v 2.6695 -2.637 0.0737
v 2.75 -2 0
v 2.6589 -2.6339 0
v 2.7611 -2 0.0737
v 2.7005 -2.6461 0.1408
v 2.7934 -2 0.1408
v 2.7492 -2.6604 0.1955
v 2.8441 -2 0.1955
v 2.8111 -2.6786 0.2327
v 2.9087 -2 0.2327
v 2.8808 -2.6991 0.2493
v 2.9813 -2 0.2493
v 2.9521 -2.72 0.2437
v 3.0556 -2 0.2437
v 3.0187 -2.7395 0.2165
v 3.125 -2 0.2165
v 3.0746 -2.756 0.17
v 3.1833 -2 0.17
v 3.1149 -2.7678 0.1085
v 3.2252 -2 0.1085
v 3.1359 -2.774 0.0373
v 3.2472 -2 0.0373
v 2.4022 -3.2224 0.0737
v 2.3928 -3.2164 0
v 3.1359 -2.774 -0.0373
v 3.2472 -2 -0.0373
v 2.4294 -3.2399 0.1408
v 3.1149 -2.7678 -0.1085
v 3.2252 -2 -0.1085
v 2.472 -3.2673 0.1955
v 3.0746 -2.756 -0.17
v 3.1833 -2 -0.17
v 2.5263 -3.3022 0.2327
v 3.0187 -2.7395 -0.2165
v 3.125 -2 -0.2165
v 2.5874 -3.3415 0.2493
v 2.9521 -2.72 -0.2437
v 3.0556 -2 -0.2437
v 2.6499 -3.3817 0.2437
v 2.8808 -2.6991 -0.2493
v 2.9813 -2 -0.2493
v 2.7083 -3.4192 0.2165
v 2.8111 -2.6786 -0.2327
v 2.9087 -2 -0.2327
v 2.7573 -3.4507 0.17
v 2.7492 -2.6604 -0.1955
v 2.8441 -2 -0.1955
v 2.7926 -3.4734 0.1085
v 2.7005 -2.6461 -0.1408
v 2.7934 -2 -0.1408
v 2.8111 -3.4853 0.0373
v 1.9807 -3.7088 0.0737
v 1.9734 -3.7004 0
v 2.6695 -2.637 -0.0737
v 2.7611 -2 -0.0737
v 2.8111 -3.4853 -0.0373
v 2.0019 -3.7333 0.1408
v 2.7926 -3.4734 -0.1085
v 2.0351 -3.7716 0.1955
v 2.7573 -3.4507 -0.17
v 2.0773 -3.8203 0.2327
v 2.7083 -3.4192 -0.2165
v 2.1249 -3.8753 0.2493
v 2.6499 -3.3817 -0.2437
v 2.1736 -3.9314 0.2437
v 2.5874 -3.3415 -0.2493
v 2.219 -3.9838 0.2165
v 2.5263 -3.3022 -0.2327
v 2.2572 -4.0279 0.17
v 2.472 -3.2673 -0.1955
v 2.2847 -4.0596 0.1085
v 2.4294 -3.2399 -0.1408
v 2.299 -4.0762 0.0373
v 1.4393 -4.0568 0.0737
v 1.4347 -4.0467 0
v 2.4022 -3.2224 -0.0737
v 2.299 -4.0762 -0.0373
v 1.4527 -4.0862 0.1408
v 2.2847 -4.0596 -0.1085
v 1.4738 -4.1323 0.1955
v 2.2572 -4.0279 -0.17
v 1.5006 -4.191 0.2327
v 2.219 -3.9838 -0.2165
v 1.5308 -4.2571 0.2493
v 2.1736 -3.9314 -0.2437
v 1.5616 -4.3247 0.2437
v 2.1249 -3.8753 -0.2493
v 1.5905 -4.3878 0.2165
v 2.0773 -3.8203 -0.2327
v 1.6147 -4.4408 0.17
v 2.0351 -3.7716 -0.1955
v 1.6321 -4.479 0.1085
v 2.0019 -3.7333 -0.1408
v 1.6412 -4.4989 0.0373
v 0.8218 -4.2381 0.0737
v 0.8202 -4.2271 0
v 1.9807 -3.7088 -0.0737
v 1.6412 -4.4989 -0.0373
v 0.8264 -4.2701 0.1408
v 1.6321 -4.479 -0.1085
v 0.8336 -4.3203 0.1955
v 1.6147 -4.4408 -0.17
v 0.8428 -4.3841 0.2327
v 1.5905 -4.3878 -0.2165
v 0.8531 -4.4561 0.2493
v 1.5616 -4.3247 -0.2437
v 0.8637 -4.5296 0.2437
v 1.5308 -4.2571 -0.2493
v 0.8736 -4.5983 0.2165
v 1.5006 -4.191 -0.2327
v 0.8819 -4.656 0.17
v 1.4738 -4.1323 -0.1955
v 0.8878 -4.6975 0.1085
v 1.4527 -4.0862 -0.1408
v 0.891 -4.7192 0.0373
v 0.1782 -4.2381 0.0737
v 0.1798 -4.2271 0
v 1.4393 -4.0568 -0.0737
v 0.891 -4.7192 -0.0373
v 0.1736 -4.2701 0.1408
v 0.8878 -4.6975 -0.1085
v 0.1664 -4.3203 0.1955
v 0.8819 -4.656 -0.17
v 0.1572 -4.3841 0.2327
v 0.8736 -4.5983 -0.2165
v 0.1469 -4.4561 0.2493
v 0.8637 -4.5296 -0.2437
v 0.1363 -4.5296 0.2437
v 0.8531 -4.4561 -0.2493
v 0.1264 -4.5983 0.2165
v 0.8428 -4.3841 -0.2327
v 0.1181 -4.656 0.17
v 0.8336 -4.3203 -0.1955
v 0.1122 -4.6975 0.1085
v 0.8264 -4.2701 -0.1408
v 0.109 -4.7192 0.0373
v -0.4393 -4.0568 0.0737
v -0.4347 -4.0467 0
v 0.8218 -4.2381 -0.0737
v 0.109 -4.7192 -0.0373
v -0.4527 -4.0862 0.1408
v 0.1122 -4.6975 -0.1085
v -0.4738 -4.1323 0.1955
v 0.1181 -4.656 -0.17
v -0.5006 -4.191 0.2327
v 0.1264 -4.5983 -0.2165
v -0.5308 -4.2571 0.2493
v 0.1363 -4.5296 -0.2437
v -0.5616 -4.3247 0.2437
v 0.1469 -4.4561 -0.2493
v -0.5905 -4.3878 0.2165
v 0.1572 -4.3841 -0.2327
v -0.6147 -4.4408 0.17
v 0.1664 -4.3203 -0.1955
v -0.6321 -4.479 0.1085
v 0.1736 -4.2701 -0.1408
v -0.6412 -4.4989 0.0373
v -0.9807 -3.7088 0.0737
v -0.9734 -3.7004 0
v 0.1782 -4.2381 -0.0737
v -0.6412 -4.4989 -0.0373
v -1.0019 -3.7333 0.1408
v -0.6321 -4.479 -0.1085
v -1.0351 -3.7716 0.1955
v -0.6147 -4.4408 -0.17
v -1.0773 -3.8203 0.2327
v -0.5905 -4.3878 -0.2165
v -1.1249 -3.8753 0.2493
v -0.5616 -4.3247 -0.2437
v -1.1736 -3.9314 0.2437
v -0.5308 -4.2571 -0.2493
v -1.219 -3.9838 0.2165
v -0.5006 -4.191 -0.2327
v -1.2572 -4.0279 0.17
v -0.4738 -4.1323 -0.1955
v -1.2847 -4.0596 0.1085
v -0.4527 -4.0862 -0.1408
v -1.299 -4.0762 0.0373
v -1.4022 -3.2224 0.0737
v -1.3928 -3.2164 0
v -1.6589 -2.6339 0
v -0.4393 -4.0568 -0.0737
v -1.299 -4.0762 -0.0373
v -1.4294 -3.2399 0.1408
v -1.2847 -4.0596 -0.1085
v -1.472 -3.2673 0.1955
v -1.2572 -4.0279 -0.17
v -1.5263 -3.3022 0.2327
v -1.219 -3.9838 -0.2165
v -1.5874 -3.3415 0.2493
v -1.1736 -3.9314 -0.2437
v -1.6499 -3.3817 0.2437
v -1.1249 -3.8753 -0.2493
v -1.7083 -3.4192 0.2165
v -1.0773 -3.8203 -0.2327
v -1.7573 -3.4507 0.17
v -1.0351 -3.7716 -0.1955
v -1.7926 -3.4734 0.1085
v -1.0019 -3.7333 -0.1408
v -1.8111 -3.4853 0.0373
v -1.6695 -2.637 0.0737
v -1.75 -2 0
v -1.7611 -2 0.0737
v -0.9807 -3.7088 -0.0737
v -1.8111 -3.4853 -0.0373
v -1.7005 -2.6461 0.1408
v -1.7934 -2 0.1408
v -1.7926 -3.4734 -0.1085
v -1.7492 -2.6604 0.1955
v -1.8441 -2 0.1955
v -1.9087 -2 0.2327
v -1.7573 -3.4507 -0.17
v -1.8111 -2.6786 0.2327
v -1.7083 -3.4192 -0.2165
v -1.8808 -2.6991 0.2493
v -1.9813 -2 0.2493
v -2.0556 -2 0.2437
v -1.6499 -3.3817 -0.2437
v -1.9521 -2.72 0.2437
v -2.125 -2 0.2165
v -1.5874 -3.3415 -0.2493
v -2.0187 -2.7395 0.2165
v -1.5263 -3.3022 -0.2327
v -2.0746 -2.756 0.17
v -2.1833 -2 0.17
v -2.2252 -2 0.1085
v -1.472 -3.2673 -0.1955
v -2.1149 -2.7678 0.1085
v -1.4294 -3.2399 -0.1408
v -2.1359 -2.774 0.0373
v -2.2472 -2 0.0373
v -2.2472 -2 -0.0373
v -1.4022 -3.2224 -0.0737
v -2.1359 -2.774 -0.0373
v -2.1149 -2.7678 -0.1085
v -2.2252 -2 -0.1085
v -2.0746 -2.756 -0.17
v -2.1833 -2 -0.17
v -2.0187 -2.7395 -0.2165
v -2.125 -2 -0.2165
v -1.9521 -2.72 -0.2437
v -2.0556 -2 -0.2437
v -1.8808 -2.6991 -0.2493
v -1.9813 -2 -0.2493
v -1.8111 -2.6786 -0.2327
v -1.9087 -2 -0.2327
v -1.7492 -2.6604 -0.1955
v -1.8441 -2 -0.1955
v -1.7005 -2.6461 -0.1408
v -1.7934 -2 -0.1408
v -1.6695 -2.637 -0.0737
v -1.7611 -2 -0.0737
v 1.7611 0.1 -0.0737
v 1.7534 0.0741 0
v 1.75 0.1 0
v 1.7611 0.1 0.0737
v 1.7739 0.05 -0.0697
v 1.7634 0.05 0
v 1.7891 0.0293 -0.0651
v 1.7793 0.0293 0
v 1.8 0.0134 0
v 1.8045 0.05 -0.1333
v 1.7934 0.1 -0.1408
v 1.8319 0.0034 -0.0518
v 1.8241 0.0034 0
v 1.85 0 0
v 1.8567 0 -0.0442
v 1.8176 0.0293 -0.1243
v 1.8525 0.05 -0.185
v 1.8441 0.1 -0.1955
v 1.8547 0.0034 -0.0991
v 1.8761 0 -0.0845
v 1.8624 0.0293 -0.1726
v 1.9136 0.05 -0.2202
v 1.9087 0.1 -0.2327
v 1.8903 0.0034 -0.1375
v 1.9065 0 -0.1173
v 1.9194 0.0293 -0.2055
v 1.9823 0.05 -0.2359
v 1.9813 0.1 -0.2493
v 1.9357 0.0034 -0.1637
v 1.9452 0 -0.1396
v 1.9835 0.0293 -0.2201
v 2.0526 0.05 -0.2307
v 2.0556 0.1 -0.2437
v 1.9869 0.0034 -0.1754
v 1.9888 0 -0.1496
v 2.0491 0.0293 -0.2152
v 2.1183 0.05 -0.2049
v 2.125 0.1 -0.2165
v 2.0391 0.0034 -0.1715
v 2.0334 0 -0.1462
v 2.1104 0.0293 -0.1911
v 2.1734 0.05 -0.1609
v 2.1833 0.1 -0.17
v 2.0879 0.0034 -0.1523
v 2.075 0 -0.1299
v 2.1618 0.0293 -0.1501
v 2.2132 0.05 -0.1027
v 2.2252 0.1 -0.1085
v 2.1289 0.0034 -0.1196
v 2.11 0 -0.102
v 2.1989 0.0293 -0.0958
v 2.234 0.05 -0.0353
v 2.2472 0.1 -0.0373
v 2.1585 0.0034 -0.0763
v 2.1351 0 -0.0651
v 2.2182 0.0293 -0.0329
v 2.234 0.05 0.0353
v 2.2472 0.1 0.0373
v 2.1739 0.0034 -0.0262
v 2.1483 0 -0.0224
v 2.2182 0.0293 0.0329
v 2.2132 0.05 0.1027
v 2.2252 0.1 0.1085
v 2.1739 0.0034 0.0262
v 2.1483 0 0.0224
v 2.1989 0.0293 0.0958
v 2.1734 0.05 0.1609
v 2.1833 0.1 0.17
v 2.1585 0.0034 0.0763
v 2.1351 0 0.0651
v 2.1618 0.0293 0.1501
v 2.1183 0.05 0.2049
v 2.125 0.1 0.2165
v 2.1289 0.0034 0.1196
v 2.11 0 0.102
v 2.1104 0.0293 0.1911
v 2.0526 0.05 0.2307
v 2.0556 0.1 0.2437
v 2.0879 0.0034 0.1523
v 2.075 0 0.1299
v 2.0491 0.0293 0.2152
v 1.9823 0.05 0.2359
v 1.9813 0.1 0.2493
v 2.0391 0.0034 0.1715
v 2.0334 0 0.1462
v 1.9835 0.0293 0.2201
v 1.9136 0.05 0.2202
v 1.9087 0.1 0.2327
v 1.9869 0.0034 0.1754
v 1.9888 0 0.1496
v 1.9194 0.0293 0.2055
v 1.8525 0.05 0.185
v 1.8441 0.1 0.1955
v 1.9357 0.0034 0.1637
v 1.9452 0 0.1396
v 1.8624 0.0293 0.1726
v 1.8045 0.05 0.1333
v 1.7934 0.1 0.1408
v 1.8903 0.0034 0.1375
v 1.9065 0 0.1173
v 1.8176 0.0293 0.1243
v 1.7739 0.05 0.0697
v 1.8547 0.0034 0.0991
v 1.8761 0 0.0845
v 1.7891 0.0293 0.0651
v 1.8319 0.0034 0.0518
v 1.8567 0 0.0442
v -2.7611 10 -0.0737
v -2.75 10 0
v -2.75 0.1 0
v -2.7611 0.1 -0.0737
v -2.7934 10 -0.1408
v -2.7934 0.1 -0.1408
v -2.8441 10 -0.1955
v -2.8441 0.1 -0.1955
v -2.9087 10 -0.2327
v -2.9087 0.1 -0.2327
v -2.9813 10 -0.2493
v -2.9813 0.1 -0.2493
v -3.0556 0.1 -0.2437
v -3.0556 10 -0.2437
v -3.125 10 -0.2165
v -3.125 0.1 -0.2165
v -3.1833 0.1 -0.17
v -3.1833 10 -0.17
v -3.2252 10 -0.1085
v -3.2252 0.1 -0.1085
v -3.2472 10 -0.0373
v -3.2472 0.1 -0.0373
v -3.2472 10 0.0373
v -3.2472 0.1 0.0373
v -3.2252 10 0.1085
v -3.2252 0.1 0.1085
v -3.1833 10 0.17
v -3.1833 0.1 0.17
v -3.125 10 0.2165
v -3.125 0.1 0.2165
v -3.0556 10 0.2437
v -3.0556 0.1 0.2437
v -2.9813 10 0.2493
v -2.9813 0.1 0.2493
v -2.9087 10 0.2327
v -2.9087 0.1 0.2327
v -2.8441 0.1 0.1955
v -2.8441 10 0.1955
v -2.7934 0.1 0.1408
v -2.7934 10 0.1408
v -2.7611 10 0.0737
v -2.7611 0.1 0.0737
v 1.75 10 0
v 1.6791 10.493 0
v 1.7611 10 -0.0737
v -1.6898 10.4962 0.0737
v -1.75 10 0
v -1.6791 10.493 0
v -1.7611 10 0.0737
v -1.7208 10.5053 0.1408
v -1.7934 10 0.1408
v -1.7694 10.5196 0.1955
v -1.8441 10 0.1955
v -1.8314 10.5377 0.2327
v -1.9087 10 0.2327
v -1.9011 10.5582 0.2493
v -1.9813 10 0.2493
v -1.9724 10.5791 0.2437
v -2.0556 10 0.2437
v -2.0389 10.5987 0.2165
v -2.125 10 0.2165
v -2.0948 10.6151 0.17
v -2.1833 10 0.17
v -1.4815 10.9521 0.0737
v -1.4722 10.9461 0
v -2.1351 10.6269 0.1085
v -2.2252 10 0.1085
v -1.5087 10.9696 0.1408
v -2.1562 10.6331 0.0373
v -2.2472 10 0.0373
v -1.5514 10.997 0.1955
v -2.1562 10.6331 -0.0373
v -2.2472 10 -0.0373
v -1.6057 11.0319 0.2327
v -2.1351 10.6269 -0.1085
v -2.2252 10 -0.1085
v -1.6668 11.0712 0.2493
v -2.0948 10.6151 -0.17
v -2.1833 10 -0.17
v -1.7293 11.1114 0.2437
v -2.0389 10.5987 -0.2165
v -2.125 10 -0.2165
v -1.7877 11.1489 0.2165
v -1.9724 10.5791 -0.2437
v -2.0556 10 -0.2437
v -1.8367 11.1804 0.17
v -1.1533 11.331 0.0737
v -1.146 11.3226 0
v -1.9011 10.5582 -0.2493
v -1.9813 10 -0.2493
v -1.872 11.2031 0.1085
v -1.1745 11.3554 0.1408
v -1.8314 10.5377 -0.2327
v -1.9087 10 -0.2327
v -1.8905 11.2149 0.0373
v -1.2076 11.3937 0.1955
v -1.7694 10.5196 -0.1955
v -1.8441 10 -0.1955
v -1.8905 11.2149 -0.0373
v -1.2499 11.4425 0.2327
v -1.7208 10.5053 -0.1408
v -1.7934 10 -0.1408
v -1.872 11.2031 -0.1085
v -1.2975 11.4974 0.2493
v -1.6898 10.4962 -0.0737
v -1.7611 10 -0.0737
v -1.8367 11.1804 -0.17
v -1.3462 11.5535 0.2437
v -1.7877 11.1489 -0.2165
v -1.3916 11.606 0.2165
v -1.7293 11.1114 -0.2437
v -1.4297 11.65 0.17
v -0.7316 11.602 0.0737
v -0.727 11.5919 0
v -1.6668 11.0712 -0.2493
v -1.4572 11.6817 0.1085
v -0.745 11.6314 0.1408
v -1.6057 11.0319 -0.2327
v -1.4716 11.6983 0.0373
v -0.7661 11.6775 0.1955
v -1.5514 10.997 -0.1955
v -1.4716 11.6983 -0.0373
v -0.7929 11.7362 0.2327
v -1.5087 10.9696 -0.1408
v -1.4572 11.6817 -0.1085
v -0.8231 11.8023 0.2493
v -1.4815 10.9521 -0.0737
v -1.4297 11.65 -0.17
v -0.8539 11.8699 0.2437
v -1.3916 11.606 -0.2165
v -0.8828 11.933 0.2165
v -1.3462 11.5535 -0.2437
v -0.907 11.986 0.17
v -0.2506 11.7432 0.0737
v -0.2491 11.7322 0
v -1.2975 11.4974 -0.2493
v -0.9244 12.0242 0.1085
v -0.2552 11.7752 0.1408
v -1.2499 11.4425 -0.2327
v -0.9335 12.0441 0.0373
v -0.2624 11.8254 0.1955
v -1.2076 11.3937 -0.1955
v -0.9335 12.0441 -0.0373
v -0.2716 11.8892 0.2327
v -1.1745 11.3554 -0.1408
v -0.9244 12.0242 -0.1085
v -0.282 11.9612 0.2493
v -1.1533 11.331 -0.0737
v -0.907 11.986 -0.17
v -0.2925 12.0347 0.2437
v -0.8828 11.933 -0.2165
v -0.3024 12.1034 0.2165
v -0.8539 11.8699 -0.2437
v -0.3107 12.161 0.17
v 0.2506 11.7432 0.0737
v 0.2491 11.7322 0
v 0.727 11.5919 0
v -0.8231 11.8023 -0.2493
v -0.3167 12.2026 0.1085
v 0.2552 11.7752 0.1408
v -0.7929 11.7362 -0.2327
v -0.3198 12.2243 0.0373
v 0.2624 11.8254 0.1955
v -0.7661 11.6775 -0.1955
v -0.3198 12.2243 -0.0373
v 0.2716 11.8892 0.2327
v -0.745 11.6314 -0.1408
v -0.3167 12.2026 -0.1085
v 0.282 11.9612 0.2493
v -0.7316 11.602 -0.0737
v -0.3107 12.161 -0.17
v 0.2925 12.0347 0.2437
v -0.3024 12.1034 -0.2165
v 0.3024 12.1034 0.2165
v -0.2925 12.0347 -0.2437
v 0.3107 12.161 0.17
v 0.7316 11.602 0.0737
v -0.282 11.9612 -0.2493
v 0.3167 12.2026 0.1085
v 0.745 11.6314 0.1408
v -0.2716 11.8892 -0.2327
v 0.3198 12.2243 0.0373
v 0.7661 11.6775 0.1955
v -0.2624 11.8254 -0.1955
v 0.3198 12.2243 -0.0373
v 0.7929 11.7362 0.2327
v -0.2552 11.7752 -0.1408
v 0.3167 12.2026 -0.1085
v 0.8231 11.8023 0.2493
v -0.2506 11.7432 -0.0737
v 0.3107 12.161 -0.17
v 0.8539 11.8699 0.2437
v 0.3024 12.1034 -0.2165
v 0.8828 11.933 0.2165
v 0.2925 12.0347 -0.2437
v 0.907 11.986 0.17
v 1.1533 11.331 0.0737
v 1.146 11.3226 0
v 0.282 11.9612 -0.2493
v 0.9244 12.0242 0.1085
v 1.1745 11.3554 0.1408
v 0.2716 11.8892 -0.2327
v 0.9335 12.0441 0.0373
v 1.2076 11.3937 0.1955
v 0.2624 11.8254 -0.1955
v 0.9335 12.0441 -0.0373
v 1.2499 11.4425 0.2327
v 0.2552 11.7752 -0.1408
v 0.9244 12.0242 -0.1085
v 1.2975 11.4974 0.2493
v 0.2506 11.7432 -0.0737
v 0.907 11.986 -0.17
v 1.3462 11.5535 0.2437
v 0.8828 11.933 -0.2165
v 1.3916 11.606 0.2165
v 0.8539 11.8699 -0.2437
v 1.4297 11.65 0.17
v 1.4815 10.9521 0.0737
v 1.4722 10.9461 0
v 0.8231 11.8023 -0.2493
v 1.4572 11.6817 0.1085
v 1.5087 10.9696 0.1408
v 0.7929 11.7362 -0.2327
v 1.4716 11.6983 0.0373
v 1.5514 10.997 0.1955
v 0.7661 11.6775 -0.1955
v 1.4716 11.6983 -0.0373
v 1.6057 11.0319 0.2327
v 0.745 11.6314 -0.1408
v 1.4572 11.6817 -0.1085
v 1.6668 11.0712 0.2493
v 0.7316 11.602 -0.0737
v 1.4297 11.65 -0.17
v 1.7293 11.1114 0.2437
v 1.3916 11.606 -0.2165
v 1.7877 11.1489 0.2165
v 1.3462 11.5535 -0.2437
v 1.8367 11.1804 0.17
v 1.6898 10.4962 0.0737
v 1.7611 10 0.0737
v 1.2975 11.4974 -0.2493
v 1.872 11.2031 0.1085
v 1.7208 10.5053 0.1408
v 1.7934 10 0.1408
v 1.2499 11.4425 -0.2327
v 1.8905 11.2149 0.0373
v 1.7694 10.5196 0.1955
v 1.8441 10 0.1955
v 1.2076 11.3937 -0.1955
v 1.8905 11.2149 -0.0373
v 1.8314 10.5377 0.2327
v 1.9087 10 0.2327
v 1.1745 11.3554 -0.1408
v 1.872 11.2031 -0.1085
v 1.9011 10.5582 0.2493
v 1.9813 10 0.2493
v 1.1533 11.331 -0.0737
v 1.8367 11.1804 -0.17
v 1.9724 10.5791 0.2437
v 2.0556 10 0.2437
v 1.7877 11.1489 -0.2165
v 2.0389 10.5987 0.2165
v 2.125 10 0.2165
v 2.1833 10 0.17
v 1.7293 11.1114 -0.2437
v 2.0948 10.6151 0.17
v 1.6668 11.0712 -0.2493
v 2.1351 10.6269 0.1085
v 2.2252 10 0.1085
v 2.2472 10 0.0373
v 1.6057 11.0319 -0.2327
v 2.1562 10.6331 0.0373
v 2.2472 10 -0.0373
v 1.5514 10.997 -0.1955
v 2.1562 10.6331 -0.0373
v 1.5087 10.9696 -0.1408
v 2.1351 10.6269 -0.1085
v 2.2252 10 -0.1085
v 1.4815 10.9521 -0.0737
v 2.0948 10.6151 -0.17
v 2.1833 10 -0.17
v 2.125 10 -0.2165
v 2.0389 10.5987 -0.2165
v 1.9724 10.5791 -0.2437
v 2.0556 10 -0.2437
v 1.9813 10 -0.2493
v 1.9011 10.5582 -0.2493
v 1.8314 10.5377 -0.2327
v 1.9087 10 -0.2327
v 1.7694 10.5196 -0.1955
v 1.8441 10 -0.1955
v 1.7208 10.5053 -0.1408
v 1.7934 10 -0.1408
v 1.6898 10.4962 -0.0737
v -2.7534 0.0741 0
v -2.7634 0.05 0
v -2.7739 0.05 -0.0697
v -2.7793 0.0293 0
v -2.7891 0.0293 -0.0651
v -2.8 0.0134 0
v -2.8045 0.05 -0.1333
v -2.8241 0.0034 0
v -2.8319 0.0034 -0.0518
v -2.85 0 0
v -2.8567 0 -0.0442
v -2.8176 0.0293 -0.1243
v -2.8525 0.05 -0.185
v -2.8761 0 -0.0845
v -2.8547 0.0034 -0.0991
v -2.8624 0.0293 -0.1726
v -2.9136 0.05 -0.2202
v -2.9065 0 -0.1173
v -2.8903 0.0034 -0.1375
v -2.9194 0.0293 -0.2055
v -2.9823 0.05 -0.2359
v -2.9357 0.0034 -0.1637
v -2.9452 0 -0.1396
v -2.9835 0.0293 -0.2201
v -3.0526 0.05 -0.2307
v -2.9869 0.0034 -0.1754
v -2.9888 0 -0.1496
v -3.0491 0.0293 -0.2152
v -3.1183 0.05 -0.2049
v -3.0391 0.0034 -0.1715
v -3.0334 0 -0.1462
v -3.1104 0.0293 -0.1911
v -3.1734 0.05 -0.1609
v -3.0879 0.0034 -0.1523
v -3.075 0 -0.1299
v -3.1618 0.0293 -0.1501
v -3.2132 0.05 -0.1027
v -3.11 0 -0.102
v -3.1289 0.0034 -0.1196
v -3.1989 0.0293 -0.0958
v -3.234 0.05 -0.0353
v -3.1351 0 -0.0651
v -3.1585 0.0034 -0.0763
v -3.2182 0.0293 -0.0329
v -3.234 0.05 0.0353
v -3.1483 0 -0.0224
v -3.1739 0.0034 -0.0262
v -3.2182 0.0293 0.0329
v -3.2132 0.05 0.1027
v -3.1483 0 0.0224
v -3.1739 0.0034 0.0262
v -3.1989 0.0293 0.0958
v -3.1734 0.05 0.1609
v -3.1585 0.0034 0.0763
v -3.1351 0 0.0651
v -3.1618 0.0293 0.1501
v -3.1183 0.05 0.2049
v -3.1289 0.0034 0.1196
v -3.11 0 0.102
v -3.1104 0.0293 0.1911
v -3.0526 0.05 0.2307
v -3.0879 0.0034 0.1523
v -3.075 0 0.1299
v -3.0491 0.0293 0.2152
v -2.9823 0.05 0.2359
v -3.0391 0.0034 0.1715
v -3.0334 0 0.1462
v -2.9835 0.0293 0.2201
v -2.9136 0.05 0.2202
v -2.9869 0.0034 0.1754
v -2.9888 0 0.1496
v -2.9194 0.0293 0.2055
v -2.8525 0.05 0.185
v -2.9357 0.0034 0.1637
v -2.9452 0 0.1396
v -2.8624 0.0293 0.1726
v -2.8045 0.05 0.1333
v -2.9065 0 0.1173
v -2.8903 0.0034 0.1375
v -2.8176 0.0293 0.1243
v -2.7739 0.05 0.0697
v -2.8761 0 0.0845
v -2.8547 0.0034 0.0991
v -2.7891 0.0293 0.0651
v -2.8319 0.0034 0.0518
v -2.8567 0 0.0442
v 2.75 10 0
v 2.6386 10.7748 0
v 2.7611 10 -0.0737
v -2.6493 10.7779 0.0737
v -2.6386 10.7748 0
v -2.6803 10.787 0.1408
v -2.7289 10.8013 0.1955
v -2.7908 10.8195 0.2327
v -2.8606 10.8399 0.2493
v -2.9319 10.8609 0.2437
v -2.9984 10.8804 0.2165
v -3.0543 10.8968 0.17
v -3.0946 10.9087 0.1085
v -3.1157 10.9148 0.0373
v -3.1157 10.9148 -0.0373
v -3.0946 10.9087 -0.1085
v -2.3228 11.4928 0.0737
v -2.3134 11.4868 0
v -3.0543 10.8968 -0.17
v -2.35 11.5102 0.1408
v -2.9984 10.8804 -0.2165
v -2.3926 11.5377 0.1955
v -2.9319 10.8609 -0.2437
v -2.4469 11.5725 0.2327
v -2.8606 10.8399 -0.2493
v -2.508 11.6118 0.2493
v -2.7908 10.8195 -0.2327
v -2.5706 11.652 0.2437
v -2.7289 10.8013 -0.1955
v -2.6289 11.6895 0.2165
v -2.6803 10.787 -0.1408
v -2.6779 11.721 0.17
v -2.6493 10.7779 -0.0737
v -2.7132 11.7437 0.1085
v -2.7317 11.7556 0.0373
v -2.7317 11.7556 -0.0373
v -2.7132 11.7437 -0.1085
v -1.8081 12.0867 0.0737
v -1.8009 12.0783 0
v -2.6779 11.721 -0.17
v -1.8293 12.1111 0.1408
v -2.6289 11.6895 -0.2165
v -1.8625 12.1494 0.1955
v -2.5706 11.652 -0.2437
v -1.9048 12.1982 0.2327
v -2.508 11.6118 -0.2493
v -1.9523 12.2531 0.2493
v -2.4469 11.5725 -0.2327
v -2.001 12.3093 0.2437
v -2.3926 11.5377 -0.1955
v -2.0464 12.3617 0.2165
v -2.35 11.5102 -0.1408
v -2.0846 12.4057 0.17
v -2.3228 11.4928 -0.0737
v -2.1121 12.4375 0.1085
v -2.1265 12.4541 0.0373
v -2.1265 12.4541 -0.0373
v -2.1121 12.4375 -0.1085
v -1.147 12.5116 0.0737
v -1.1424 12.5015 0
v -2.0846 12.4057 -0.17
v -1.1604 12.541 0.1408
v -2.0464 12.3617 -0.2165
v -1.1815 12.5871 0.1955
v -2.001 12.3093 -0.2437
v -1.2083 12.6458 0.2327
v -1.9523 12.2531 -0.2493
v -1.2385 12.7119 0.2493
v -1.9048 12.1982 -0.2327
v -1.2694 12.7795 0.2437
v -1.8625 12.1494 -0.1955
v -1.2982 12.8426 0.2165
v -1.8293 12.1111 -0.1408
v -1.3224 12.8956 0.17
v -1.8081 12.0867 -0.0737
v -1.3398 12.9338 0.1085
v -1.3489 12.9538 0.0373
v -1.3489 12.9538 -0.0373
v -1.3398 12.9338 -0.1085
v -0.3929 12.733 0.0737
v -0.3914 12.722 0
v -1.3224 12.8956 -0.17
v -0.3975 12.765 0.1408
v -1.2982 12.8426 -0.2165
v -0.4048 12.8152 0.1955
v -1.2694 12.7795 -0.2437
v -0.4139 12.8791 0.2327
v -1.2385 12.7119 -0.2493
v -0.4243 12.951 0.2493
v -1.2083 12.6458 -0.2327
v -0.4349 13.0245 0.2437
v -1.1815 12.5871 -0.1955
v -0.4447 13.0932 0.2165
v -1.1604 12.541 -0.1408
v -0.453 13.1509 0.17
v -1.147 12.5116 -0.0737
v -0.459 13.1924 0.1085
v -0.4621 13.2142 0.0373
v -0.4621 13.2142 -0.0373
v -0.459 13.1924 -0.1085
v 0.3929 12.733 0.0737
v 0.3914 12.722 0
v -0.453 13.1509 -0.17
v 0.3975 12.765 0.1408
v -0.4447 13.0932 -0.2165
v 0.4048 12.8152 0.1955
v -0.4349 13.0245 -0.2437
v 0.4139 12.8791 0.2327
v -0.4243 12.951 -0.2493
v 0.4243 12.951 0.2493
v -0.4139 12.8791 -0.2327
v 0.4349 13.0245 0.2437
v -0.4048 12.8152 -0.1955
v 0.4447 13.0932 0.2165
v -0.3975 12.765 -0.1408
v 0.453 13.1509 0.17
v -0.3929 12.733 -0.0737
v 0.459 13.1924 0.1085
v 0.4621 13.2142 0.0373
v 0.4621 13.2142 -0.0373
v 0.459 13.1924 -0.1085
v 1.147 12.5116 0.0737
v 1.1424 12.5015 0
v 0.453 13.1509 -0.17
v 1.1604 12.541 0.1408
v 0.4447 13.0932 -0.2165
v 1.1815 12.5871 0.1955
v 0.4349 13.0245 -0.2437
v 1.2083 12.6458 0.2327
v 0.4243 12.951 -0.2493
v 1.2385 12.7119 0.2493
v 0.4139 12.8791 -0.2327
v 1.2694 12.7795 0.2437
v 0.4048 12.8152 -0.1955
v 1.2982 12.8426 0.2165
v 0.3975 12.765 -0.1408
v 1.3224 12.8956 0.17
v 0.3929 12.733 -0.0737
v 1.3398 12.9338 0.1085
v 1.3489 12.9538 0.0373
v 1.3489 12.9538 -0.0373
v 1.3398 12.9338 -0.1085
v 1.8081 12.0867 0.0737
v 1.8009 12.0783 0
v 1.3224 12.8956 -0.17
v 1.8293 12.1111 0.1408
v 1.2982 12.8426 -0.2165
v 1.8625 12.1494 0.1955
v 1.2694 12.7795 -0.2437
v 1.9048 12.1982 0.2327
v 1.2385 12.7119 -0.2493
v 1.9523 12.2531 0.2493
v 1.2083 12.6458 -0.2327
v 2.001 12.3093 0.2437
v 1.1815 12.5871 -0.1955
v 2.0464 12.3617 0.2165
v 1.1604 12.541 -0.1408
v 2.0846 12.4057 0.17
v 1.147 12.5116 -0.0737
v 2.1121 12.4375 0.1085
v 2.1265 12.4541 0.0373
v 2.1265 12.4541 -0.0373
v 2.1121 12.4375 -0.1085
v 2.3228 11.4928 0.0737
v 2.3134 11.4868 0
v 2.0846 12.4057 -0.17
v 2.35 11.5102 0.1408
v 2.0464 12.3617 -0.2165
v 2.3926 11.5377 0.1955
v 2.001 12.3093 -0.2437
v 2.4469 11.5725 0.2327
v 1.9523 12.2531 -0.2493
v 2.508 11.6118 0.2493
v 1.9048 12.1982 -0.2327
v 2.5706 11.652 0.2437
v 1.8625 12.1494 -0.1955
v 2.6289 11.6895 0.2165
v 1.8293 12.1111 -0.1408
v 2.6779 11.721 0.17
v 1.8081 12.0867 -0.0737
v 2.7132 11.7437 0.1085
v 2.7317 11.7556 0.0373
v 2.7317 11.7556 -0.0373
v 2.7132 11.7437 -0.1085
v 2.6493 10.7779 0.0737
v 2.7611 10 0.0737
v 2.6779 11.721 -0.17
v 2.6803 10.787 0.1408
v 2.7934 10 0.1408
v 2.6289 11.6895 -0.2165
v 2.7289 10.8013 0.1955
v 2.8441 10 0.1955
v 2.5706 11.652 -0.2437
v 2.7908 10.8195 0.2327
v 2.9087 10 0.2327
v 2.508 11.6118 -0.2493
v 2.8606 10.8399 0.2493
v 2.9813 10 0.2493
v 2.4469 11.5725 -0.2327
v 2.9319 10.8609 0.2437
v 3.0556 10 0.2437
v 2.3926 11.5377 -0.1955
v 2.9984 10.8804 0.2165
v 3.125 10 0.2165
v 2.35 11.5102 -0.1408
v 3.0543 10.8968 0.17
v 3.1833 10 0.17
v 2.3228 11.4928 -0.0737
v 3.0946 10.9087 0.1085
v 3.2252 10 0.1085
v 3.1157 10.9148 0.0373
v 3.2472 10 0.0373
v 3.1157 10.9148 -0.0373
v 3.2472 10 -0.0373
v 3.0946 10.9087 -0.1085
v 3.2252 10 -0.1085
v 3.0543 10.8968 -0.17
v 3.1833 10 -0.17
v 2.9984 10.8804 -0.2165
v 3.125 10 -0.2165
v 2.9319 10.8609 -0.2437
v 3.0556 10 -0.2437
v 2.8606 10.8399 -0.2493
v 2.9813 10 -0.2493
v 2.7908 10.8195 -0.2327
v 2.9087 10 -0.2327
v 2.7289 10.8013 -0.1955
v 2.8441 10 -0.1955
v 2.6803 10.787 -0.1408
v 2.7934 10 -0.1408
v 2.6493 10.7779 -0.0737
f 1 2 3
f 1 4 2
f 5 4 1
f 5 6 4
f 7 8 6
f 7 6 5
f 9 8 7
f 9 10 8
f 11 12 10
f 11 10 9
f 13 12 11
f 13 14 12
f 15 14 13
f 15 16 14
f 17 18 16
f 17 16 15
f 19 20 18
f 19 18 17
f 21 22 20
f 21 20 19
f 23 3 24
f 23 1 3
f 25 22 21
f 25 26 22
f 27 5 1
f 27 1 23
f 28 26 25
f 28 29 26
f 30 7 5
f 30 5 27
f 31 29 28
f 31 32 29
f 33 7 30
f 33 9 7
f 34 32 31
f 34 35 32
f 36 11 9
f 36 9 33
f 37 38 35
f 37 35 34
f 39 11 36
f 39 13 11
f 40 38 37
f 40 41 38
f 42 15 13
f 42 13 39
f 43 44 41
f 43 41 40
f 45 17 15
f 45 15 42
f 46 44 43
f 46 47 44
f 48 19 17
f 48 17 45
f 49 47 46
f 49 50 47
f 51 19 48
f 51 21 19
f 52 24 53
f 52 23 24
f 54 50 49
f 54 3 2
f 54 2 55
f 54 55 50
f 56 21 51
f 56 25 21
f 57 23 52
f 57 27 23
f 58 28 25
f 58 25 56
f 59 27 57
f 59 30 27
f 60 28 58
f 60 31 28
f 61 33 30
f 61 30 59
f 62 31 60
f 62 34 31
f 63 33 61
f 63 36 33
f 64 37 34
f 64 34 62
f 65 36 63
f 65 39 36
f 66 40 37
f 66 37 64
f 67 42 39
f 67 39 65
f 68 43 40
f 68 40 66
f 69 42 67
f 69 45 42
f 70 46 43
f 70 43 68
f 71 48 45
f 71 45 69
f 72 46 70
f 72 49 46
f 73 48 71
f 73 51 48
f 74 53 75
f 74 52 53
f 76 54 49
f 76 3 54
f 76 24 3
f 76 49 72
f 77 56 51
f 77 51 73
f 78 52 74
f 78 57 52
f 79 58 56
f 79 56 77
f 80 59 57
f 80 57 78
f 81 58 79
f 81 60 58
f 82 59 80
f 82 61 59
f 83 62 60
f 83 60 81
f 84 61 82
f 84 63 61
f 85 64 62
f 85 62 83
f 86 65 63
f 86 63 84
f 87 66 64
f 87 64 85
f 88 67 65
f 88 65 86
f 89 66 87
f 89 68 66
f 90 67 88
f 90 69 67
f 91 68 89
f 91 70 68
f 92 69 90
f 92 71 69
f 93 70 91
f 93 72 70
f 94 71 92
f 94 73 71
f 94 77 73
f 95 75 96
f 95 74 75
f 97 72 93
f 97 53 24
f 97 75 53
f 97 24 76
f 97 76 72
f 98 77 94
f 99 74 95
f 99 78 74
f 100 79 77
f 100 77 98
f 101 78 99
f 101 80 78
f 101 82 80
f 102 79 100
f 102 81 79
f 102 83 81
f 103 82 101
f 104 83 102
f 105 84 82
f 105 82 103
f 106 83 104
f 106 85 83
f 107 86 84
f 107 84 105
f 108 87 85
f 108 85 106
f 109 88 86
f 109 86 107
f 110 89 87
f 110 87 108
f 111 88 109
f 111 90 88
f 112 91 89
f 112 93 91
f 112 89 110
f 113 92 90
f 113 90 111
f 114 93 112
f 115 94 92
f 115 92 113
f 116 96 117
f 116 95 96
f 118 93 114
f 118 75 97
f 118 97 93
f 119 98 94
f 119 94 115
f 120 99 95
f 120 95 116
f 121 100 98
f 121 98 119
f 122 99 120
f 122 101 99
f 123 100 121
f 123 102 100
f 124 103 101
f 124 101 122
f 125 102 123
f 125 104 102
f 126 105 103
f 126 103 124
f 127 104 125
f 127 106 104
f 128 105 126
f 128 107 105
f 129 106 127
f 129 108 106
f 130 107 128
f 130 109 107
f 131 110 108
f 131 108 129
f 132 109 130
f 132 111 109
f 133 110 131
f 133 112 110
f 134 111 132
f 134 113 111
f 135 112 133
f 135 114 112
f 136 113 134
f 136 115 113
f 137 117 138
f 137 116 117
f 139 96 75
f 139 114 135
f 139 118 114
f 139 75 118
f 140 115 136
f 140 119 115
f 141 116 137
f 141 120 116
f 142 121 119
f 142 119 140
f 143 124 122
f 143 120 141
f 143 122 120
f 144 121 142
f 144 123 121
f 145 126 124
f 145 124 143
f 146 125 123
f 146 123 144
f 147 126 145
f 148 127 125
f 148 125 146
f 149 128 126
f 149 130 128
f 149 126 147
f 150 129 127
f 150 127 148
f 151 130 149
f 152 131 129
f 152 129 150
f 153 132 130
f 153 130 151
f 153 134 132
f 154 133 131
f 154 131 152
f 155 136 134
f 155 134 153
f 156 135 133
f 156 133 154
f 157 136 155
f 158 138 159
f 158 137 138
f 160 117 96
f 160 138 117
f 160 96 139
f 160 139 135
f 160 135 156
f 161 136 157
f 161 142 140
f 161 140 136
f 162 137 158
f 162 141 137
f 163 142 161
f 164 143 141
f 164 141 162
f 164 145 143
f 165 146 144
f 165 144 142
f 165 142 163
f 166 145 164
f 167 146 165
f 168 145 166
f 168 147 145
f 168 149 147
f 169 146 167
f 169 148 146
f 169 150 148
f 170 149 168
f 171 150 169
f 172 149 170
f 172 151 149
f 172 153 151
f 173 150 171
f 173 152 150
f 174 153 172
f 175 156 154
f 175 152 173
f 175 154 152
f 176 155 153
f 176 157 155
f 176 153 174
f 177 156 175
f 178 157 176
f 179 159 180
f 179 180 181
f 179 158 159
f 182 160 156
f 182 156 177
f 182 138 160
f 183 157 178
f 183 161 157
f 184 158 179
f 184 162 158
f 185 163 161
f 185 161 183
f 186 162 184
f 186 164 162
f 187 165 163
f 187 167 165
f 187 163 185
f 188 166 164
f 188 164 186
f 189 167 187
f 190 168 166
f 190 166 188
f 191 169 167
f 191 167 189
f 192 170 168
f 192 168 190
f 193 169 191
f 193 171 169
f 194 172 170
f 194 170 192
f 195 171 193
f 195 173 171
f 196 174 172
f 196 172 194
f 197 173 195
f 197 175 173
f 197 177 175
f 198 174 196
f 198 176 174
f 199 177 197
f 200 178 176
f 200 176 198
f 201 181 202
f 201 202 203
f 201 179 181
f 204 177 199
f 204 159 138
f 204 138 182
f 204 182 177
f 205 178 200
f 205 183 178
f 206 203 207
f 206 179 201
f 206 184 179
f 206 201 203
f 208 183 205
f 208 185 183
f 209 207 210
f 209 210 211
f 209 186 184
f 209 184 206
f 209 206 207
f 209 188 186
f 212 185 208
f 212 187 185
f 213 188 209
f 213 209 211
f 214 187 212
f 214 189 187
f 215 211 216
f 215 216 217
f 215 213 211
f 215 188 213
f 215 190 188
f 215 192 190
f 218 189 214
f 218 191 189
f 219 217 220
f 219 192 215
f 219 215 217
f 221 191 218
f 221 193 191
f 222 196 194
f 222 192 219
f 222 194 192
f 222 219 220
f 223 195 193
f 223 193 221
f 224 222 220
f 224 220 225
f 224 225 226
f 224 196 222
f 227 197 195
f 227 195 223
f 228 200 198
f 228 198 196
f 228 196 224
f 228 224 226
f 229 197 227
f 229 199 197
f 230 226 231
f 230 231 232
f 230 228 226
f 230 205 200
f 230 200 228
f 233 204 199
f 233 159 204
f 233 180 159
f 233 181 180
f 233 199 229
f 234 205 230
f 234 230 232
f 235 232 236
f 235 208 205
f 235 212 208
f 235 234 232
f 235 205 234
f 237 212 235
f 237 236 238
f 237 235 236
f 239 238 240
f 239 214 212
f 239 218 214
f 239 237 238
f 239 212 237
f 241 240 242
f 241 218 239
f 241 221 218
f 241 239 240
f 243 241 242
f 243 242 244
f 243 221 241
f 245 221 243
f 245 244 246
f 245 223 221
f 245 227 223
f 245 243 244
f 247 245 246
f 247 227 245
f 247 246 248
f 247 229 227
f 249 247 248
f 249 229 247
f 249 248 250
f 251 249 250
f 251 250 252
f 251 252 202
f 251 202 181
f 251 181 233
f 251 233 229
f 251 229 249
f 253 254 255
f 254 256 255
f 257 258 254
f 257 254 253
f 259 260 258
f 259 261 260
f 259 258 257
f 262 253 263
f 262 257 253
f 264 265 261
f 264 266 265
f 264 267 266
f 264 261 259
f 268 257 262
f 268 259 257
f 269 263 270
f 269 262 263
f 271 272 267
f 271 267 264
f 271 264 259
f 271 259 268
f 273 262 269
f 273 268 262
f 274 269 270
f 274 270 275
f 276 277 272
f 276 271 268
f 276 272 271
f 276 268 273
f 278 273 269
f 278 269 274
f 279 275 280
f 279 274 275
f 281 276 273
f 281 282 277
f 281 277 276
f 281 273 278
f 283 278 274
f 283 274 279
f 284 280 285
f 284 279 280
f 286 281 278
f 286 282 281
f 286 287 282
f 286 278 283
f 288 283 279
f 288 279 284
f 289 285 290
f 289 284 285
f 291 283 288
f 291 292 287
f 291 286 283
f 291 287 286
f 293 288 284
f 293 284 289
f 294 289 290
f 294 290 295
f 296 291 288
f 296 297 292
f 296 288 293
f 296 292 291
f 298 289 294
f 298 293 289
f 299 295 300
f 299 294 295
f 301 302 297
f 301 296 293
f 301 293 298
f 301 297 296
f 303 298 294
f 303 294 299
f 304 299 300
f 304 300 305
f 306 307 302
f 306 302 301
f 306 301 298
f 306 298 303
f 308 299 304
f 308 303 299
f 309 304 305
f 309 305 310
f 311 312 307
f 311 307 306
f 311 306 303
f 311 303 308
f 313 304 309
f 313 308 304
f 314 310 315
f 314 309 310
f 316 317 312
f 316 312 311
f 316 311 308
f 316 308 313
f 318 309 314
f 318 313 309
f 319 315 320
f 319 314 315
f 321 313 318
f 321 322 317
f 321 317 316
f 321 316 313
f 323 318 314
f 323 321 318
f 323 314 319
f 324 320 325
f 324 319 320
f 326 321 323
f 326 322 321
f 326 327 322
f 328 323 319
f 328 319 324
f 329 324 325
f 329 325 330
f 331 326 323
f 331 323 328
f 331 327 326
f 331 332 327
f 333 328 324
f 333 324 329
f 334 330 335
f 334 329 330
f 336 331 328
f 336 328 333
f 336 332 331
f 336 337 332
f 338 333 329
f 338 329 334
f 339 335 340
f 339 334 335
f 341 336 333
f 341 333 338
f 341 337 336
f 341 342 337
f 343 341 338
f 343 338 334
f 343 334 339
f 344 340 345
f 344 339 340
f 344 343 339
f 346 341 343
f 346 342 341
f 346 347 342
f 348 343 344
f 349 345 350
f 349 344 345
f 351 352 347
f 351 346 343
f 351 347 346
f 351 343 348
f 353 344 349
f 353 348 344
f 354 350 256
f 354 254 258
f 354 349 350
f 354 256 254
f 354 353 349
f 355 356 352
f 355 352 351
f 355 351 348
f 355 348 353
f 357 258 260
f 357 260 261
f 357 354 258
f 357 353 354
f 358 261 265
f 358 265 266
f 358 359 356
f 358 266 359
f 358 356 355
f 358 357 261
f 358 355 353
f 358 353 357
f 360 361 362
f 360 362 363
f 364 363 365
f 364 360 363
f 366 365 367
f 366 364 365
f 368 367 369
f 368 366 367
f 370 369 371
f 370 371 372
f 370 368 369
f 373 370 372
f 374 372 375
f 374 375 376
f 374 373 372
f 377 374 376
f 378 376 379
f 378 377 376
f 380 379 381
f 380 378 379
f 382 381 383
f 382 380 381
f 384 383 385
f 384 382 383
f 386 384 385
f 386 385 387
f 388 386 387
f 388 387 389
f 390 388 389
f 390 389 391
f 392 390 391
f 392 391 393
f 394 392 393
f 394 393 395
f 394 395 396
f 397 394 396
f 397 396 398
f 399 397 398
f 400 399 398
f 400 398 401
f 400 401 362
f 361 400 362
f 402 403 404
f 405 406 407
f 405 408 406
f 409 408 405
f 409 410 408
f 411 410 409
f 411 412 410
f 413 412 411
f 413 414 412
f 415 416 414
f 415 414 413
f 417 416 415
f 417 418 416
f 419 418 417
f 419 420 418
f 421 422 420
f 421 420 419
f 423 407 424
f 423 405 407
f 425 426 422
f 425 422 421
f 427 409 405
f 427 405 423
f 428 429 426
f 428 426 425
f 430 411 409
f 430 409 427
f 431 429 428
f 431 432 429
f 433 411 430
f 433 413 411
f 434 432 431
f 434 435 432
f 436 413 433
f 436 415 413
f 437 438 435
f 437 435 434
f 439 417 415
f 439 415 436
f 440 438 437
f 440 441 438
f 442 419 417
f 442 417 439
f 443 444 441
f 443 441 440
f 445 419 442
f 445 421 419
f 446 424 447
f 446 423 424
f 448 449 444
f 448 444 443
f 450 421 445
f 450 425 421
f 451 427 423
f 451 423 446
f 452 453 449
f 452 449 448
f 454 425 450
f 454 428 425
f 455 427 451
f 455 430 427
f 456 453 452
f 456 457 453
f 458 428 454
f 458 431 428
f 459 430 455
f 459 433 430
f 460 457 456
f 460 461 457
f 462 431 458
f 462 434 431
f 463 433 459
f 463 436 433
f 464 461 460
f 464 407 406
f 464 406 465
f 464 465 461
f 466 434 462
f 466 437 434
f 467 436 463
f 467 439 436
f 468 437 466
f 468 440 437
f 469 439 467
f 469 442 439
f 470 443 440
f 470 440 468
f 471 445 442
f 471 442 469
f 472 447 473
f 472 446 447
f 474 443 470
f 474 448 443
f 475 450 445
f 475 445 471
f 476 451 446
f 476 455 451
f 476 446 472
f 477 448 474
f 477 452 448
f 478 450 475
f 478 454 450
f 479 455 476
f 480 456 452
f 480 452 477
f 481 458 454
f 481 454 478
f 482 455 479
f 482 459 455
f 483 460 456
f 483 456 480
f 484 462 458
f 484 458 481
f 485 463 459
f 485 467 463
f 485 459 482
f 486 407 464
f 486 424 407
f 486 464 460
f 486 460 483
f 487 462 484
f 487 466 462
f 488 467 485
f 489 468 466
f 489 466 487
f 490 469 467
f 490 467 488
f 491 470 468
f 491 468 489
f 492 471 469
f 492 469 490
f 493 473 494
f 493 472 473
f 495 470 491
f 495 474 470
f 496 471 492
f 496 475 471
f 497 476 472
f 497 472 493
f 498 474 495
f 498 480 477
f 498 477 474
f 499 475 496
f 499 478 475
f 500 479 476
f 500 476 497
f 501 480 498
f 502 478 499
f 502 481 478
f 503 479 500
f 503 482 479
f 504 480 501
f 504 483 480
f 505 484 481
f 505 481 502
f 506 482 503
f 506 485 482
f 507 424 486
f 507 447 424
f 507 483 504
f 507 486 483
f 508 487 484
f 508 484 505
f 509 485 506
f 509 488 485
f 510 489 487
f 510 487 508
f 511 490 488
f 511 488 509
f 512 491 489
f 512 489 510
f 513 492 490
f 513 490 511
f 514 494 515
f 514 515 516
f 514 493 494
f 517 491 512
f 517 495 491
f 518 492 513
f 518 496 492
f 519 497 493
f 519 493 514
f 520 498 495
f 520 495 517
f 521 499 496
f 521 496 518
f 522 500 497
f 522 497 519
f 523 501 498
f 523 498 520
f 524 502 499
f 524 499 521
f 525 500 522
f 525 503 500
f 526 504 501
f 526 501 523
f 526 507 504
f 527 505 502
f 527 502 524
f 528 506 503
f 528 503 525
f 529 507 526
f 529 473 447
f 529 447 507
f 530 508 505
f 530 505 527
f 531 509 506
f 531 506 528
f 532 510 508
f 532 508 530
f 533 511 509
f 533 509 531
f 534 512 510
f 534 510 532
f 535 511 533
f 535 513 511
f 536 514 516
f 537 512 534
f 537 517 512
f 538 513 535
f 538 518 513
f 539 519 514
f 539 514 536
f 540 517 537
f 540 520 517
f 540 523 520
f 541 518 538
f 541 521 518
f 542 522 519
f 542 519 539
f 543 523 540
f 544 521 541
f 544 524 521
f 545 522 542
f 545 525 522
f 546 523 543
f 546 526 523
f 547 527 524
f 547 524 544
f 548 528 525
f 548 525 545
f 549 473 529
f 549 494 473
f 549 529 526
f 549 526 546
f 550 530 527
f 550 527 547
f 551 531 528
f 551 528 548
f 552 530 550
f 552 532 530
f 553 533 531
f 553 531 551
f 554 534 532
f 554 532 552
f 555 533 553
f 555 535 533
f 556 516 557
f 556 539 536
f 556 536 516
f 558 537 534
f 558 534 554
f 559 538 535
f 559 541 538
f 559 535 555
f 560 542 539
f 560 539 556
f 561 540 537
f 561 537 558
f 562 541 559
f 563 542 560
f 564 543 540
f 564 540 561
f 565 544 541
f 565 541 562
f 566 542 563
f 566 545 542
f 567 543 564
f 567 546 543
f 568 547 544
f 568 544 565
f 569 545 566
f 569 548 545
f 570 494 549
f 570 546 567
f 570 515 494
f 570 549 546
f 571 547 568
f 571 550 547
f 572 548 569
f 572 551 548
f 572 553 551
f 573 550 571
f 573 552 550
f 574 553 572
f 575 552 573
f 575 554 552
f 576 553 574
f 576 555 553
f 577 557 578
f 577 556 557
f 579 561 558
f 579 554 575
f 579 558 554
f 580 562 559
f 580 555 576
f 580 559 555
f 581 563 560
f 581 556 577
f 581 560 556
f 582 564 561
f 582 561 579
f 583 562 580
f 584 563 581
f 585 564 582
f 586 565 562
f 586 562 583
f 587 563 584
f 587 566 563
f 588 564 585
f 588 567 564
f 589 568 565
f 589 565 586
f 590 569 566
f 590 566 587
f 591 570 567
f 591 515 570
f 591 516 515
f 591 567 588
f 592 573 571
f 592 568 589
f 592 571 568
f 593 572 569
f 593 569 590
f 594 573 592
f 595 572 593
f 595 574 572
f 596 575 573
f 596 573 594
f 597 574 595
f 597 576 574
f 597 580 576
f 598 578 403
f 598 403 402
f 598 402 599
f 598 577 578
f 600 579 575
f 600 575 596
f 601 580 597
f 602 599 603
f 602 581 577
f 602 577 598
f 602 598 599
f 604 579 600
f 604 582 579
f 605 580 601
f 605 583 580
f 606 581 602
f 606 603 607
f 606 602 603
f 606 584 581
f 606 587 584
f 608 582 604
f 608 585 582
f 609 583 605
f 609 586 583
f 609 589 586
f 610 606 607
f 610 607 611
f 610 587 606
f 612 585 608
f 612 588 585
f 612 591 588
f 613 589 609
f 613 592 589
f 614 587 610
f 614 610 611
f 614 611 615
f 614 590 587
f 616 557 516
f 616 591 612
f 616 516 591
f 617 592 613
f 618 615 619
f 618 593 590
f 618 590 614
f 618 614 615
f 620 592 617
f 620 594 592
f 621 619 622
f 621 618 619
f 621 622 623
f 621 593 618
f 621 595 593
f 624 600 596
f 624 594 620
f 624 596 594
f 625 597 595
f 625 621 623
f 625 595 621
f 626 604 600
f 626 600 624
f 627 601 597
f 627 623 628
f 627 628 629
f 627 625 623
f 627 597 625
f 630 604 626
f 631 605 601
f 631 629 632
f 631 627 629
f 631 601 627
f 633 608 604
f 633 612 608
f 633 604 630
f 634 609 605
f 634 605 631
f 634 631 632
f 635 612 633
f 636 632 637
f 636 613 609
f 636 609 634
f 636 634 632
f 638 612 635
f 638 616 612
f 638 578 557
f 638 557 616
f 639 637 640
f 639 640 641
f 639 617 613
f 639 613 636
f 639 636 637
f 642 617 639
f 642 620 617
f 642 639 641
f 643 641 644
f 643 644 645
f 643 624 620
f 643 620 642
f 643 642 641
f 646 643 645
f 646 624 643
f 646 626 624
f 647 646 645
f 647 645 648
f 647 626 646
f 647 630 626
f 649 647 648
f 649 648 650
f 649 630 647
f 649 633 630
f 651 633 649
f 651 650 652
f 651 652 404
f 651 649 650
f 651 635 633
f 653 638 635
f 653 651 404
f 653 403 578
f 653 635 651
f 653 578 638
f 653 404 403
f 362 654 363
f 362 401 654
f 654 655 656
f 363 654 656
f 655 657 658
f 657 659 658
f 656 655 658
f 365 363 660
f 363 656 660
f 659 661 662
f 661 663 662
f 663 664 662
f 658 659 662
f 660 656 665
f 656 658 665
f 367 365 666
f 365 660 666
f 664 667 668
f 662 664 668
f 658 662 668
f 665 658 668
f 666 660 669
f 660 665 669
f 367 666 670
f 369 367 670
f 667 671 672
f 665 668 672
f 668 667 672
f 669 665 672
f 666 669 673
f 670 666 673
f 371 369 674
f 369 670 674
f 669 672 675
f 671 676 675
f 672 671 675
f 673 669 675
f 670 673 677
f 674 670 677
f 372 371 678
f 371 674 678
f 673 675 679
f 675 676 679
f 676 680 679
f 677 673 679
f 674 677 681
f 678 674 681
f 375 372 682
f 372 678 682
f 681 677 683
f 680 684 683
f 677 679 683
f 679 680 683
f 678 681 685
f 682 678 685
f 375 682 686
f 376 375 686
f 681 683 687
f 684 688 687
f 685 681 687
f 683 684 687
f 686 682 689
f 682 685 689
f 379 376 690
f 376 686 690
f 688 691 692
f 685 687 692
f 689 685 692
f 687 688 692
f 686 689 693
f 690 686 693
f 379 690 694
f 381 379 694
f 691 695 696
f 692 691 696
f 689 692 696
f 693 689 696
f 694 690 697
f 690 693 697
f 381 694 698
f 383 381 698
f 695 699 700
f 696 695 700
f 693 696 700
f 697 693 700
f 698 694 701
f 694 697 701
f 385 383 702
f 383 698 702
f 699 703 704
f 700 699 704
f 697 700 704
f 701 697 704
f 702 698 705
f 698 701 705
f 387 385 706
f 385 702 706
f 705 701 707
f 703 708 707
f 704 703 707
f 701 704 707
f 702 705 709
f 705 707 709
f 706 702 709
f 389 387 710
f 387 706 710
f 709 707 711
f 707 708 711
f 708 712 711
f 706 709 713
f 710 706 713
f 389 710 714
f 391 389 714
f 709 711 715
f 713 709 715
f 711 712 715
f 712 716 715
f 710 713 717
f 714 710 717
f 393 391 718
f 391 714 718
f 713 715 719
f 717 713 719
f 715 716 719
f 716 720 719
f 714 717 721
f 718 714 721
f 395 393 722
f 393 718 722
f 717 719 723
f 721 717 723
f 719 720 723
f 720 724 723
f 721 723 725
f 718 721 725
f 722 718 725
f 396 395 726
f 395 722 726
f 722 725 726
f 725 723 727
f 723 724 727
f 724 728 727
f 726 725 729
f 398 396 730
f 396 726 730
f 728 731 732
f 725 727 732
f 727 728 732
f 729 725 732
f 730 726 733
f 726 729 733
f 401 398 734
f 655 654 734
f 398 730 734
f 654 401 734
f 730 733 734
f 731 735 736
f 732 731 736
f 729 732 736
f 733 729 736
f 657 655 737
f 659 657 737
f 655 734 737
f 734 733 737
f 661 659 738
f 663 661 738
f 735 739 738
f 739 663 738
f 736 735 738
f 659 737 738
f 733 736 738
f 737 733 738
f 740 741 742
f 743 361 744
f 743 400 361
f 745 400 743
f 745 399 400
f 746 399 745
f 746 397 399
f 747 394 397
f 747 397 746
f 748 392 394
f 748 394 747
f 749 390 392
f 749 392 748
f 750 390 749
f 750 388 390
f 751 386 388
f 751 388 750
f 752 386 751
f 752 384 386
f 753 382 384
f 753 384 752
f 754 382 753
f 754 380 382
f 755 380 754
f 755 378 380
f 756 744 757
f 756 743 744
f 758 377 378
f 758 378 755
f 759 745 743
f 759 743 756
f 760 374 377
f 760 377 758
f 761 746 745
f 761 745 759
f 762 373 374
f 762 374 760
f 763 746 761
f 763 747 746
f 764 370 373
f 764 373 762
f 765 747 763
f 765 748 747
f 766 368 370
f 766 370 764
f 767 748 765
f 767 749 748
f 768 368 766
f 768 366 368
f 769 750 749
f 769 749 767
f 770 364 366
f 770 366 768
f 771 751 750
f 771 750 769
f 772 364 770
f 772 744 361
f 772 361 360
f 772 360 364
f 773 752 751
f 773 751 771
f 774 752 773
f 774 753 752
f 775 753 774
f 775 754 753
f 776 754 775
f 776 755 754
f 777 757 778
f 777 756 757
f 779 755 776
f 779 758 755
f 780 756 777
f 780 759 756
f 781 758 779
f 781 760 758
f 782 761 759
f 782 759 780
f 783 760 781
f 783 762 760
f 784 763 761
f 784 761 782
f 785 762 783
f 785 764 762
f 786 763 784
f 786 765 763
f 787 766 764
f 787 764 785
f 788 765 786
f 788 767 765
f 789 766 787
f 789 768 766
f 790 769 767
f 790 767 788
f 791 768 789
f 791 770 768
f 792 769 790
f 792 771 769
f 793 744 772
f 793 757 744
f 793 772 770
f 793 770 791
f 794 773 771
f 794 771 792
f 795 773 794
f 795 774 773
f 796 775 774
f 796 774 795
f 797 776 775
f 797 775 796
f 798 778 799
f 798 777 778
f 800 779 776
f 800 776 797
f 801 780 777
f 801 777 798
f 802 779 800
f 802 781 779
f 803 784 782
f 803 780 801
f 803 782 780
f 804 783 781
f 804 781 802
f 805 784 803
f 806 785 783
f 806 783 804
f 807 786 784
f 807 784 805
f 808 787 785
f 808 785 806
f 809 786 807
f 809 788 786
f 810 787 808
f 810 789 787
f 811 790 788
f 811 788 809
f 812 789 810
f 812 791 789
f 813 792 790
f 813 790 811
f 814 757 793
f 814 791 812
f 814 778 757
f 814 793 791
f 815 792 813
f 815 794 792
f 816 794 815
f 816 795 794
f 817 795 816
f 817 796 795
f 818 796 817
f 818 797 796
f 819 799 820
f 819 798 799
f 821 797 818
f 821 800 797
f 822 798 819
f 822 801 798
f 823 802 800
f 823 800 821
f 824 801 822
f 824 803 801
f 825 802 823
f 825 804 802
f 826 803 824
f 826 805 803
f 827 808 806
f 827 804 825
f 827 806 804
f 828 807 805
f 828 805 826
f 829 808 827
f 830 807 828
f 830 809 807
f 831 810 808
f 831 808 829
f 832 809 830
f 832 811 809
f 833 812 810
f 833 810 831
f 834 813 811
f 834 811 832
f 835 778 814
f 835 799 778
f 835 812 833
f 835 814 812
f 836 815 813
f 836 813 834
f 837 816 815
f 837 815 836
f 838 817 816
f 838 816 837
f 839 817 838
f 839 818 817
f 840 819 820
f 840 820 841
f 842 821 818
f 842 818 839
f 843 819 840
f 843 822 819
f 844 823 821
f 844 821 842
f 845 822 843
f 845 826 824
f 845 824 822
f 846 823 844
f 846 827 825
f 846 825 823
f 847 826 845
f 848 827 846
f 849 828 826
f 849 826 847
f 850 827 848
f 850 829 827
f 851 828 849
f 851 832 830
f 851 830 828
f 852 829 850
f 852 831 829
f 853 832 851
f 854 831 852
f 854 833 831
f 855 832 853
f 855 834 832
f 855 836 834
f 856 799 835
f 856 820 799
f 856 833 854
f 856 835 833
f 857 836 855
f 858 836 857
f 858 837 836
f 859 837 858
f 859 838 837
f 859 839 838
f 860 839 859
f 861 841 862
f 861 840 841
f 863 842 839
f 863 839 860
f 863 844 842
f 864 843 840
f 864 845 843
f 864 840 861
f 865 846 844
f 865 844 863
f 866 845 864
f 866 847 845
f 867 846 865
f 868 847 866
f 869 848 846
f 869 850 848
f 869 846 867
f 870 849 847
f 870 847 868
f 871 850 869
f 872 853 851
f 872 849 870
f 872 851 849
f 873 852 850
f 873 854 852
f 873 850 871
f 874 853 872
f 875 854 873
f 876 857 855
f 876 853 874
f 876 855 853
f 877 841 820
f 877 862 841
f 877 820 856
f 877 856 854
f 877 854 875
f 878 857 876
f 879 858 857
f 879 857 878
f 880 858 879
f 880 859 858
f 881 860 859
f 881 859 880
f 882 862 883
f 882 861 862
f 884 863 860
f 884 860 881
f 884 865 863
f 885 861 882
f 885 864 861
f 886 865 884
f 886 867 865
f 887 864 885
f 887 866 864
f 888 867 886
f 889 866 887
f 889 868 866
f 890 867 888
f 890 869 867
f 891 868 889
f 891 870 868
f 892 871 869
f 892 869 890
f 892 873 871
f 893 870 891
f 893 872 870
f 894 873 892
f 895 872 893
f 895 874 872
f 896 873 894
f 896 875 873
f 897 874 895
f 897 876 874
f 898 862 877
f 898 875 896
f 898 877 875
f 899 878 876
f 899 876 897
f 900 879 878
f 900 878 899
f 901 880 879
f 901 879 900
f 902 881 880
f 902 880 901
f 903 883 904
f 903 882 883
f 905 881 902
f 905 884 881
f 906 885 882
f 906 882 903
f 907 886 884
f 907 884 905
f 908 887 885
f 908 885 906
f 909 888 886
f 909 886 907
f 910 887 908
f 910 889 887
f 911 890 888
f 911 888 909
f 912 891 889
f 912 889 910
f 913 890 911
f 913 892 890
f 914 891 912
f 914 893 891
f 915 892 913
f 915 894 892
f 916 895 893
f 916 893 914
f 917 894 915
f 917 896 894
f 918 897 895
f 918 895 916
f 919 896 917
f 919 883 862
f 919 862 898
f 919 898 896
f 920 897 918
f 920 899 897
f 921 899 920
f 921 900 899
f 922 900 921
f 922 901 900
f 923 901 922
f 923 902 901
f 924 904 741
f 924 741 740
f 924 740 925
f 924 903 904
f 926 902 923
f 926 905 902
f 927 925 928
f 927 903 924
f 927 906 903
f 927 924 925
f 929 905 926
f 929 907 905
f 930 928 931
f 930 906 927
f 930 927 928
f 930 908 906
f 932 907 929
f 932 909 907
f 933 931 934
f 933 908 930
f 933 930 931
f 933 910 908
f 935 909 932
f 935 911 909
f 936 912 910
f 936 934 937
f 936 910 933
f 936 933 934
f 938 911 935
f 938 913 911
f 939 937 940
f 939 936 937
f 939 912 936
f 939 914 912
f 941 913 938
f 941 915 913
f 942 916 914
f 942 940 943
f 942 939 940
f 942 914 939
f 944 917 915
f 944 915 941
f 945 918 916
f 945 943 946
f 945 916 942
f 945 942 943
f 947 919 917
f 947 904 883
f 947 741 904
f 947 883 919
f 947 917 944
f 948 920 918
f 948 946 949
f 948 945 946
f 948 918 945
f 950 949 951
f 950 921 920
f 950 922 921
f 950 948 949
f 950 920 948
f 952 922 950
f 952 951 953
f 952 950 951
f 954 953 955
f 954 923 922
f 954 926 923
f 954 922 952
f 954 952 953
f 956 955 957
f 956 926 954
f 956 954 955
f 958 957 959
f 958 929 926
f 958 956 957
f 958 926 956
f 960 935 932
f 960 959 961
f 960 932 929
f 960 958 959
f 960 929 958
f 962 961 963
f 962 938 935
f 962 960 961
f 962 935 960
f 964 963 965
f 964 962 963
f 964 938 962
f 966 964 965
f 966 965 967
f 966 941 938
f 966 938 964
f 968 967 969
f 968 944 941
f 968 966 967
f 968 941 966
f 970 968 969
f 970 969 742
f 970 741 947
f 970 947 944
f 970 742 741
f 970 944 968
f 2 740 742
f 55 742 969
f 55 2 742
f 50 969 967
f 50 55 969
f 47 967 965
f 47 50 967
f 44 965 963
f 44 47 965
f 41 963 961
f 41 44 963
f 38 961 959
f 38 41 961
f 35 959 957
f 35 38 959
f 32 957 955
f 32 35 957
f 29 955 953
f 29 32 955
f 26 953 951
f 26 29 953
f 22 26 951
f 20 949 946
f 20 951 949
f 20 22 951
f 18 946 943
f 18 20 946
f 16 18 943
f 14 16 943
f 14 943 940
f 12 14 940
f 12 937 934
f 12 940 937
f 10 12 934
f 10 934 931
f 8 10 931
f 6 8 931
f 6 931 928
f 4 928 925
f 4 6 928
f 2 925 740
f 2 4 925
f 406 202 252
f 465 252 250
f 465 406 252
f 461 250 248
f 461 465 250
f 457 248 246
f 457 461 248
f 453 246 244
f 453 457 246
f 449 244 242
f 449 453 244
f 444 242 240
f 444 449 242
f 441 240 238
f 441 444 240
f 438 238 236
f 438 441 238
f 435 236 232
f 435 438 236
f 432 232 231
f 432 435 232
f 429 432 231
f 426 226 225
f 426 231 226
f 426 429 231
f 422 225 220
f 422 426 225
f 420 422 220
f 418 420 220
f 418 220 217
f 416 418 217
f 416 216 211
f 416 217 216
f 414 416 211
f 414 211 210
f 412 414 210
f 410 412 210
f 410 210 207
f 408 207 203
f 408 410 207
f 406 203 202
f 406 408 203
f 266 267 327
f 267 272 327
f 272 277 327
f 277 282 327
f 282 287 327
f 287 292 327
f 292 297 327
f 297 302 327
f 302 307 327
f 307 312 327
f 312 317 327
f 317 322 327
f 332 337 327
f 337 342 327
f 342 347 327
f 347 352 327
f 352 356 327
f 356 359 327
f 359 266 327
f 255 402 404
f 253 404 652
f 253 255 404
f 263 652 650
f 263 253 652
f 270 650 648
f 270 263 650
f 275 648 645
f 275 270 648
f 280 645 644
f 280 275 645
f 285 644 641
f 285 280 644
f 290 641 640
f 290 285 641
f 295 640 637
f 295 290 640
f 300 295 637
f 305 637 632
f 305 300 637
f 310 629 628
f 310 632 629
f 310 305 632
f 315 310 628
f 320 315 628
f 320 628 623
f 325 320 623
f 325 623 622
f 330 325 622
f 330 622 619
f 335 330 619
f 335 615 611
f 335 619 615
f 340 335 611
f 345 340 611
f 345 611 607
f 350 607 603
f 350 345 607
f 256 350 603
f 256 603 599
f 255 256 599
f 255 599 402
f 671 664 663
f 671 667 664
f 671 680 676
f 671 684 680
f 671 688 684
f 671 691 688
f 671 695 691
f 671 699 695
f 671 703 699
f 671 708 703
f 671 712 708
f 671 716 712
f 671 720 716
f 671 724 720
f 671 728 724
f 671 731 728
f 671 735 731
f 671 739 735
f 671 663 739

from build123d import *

# Parameters (mm, degrees)
F1_R = 0.25
F3_R = 0.1


with BuildPart() as f2:
    # F2: sweep along a path in F0
    with BuildLine(Plane.XY) as f2_path:
        Line((-3, 0), (-3, 10))
        ThreePointArc((-3, 10), (0, 13), (3, 10))
        Line((3, 10), (3, -2))
        ThreePointArc((3, -2), (0.5, -4.5), (-2, -2))
        Line((-2, -2), (-2, 10))
        ThreePointArc((-2, 10), (0, 12), (2, 10))
        Line((2, 10), (2, 0))
    # F1 (on Front) → F2 (sweep)
    with BuildSketch(Plane.XZ):
        with Locations((-3, 0)):
            Circle(F1_R)
    sweep(path=f2_path.line)

    # F3
    f3_edges = [f2.edges().sort_by_distance(p)[0] for p in [
        (2.25, 0, 0),
        (-3.25, 0, 0),
    ]]
    fillet(f3_edges, radius=F3_R)


solid = f2.part
